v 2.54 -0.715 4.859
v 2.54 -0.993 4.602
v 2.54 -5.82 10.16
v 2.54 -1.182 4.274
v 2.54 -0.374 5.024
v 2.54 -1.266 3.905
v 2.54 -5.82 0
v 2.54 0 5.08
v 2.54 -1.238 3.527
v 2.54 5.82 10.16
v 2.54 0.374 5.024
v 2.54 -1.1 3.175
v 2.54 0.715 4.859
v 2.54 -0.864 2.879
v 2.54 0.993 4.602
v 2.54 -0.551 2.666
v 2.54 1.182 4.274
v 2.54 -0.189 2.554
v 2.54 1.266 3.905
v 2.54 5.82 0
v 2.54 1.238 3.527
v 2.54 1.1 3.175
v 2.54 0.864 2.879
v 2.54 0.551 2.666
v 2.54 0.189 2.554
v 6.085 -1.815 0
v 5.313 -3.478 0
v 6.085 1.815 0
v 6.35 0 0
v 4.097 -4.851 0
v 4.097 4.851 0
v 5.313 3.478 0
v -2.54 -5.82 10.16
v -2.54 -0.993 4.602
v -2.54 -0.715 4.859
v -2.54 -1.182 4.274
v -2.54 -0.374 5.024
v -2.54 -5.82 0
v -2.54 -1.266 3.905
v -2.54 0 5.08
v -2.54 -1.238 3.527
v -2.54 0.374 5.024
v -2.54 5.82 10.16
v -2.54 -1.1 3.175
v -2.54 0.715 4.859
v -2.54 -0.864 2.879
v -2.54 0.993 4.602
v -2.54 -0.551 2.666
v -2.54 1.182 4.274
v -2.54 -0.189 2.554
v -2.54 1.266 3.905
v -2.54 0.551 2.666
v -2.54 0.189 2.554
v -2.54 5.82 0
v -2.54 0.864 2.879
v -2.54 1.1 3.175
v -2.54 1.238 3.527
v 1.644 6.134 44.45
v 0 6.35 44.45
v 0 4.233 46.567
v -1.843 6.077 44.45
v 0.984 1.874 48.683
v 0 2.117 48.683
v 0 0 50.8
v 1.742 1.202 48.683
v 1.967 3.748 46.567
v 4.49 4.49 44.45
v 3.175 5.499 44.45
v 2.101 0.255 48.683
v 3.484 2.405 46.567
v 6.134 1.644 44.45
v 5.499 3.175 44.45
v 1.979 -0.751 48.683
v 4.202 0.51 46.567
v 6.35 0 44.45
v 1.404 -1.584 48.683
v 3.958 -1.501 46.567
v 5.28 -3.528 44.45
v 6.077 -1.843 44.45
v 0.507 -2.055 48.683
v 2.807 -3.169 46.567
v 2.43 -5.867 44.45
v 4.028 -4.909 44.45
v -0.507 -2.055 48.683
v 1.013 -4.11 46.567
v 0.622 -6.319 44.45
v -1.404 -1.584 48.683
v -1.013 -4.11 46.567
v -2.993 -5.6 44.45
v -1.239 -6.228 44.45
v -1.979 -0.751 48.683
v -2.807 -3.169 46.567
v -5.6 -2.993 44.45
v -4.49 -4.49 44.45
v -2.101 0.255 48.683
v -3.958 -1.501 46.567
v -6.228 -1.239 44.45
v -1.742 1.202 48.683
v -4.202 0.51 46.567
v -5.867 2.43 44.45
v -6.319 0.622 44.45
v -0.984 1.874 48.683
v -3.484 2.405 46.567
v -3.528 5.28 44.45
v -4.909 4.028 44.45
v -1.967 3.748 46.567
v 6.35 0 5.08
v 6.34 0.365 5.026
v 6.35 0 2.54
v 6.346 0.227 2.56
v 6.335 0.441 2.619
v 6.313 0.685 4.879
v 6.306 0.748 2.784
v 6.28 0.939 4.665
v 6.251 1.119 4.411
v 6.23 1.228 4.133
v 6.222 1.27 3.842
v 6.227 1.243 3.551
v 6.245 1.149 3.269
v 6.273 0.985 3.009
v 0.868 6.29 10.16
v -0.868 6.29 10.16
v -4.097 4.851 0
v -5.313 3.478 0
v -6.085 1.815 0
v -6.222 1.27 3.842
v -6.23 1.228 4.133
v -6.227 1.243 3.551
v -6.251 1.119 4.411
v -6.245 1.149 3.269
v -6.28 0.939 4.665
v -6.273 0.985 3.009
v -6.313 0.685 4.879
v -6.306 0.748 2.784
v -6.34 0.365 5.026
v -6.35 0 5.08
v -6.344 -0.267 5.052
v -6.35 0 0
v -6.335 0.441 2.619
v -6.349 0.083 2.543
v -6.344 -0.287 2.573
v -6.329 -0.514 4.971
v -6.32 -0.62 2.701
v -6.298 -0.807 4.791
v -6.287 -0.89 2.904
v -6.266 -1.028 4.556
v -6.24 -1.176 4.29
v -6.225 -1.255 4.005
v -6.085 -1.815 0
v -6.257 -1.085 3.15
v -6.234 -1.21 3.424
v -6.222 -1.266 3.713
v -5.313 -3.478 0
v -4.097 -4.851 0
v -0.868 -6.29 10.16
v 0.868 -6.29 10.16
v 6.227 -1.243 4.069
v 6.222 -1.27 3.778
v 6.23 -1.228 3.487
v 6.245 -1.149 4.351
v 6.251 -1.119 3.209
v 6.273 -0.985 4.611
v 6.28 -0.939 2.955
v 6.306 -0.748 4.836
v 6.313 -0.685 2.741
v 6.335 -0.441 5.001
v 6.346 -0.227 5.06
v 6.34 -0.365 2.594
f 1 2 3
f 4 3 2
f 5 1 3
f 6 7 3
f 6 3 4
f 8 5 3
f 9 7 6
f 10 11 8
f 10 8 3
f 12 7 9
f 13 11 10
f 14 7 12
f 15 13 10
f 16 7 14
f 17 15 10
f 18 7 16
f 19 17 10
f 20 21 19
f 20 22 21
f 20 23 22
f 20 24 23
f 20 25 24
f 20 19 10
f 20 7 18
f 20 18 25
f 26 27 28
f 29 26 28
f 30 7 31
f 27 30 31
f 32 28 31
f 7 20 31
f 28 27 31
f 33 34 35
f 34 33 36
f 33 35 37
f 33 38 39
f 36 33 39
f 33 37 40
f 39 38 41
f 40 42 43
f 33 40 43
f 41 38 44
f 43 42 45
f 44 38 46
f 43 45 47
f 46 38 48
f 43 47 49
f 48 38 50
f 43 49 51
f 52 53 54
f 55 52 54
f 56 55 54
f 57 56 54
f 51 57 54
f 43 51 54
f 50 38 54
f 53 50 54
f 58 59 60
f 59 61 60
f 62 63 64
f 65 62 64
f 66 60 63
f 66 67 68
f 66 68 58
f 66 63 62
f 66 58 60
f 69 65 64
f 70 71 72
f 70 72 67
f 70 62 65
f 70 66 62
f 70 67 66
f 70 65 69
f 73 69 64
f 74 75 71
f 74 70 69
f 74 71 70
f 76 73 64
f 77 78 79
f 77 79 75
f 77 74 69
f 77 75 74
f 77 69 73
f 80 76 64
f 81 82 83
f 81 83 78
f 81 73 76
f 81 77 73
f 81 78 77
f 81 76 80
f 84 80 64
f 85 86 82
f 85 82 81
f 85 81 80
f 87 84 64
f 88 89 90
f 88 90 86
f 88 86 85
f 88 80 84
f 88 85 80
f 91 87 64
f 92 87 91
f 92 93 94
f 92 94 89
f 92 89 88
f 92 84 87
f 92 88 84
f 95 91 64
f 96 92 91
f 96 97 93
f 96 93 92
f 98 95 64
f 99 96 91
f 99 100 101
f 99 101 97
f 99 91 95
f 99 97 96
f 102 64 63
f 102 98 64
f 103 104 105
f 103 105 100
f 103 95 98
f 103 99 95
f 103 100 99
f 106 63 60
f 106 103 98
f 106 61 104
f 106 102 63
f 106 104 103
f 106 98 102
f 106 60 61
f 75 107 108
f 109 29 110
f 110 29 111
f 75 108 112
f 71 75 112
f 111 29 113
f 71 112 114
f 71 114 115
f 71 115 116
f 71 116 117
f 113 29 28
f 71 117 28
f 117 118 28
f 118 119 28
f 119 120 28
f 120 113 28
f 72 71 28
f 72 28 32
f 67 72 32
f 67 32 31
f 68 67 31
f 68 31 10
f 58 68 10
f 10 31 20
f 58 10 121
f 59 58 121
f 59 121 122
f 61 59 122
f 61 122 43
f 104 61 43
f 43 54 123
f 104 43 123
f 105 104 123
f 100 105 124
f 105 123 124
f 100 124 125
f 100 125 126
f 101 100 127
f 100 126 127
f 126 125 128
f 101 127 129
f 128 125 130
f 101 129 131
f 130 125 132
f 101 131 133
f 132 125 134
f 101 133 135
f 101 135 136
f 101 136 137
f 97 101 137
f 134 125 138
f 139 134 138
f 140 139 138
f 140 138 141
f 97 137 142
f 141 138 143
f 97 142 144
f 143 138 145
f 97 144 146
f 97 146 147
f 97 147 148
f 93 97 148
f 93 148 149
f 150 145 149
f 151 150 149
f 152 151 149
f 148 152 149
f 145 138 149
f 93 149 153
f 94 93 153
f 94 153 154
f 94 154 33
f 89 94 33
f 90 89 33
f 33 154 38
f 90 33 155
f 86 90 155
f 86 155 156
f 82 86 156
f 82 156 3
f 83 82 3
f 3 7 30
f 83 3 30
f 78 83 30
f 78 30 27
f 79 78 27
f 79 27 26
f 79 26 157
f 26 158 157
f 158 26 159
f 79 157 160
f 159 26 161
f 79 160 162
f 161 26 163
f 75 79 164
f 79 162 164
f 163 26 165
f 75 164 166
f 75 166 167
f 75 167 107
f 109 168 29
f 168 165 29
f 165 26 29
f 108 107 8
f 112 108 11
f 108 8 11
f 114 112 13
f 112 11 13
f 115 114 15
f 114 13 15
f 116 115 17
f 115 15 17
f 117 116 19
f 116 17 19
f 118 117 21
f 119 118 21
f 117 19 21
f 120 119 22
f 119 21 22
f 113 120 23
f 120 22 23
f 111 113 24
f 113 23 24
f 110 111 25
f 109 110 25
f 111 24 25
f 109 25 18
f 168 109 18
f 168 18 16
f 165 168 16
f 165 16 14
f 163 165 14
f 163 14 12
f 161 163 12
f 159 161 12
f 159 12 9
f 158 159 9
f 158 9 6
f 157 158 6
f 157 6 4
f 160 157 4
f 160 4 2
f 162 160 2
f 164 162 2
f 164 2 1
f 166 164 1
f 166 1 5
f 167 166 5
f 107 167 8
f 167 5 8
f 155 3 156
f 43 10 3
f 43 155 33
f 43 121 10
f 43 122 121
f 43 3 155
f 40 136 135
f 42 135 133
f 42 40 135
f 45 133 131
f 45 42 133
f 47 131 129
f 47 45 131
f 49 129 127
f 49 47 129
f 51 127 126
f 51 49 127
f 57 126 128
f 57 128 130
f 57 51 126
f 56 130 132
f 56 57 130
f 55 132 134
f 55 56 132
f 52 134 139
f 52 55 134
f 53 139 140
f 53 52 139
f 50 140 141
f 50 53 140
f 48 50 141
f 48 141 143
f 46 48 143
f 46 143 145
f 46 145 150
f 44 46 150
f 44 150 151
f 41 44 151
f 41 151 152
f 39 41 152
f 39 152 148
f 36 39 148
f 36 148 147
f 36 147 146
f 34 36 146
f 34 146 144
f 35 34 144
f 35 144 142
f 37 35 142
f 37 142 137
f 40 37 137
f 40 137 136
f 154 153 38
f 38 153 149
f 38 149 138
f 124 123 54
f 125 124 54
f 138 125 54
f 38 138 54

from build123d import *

# Parameters (mm, degrees)
SKETCH2_R               = 6.35
BOSS_EXTRUDE1_DEPTH     = 44.45
SKETCH4_W               = 5.08
SKETCH4_H               = 12.7
CUT_EXTRUDE1_DEPTH      = 10.16
SKETCH5_R               = 1.27
CUT_EXTRUDE2_DEPTH      = 9.89
CUT_EXTRUDE2_DEPTH_BACK = 4.81


with BuildPart() as part:
    # Sketch2 → Boss-Extrude1 (new body)
    with BuildSketch(Plane.XY):
        Circle(SKETCH2_R)
    extrude(amount=BOSS_EXTRUDE1_DEPTH)

    # Sketch3 → Revolve1 (revolve)
    with BuildSketch(Plane(origin=(0, 0, 0), x_dir=(0, 0, -1), z_dir=(1, 0, 0))):
        Polygon((-50.8, 0), (-44.45, 6.35), (-44.45, 0), align=None)
    revolve(axis=Axis((0, 0, 50.8), (0, 0, -1)))

    # Sketch4 → Cut-Extrude1 (cut)
    with BuildSketch(Plane(origin=(0, 0, 0), x_dir=(-1, 0, 0), z_dir=(0, 0, -1))):
        Rectangle(SKETCH4_W, SKETCH4_H)
    extrude(amount=-CUT_EXTRUDE1_DEPTH, mode=Mode.SUBTRACT)

    # Sketch5 → Cut-Extrude2 (cut, two sides)
    with BuildSketch(Plane.ZY.offset(-2.54)) as cut_extrude2_sk:
        with Locations((3.81, 0)):
            Circle(SKETCH5_R)
    extrude(amount=CUT_EXTRUDE2_DEPTH, mode=Mode.SUBTRACT)
    extrude(cut_extrude2_sk.sketch, amount=-CUT_EXTRUDE2_DEPTH_BACK, mode=Mode.SUBTRACT)


solid = part.part
